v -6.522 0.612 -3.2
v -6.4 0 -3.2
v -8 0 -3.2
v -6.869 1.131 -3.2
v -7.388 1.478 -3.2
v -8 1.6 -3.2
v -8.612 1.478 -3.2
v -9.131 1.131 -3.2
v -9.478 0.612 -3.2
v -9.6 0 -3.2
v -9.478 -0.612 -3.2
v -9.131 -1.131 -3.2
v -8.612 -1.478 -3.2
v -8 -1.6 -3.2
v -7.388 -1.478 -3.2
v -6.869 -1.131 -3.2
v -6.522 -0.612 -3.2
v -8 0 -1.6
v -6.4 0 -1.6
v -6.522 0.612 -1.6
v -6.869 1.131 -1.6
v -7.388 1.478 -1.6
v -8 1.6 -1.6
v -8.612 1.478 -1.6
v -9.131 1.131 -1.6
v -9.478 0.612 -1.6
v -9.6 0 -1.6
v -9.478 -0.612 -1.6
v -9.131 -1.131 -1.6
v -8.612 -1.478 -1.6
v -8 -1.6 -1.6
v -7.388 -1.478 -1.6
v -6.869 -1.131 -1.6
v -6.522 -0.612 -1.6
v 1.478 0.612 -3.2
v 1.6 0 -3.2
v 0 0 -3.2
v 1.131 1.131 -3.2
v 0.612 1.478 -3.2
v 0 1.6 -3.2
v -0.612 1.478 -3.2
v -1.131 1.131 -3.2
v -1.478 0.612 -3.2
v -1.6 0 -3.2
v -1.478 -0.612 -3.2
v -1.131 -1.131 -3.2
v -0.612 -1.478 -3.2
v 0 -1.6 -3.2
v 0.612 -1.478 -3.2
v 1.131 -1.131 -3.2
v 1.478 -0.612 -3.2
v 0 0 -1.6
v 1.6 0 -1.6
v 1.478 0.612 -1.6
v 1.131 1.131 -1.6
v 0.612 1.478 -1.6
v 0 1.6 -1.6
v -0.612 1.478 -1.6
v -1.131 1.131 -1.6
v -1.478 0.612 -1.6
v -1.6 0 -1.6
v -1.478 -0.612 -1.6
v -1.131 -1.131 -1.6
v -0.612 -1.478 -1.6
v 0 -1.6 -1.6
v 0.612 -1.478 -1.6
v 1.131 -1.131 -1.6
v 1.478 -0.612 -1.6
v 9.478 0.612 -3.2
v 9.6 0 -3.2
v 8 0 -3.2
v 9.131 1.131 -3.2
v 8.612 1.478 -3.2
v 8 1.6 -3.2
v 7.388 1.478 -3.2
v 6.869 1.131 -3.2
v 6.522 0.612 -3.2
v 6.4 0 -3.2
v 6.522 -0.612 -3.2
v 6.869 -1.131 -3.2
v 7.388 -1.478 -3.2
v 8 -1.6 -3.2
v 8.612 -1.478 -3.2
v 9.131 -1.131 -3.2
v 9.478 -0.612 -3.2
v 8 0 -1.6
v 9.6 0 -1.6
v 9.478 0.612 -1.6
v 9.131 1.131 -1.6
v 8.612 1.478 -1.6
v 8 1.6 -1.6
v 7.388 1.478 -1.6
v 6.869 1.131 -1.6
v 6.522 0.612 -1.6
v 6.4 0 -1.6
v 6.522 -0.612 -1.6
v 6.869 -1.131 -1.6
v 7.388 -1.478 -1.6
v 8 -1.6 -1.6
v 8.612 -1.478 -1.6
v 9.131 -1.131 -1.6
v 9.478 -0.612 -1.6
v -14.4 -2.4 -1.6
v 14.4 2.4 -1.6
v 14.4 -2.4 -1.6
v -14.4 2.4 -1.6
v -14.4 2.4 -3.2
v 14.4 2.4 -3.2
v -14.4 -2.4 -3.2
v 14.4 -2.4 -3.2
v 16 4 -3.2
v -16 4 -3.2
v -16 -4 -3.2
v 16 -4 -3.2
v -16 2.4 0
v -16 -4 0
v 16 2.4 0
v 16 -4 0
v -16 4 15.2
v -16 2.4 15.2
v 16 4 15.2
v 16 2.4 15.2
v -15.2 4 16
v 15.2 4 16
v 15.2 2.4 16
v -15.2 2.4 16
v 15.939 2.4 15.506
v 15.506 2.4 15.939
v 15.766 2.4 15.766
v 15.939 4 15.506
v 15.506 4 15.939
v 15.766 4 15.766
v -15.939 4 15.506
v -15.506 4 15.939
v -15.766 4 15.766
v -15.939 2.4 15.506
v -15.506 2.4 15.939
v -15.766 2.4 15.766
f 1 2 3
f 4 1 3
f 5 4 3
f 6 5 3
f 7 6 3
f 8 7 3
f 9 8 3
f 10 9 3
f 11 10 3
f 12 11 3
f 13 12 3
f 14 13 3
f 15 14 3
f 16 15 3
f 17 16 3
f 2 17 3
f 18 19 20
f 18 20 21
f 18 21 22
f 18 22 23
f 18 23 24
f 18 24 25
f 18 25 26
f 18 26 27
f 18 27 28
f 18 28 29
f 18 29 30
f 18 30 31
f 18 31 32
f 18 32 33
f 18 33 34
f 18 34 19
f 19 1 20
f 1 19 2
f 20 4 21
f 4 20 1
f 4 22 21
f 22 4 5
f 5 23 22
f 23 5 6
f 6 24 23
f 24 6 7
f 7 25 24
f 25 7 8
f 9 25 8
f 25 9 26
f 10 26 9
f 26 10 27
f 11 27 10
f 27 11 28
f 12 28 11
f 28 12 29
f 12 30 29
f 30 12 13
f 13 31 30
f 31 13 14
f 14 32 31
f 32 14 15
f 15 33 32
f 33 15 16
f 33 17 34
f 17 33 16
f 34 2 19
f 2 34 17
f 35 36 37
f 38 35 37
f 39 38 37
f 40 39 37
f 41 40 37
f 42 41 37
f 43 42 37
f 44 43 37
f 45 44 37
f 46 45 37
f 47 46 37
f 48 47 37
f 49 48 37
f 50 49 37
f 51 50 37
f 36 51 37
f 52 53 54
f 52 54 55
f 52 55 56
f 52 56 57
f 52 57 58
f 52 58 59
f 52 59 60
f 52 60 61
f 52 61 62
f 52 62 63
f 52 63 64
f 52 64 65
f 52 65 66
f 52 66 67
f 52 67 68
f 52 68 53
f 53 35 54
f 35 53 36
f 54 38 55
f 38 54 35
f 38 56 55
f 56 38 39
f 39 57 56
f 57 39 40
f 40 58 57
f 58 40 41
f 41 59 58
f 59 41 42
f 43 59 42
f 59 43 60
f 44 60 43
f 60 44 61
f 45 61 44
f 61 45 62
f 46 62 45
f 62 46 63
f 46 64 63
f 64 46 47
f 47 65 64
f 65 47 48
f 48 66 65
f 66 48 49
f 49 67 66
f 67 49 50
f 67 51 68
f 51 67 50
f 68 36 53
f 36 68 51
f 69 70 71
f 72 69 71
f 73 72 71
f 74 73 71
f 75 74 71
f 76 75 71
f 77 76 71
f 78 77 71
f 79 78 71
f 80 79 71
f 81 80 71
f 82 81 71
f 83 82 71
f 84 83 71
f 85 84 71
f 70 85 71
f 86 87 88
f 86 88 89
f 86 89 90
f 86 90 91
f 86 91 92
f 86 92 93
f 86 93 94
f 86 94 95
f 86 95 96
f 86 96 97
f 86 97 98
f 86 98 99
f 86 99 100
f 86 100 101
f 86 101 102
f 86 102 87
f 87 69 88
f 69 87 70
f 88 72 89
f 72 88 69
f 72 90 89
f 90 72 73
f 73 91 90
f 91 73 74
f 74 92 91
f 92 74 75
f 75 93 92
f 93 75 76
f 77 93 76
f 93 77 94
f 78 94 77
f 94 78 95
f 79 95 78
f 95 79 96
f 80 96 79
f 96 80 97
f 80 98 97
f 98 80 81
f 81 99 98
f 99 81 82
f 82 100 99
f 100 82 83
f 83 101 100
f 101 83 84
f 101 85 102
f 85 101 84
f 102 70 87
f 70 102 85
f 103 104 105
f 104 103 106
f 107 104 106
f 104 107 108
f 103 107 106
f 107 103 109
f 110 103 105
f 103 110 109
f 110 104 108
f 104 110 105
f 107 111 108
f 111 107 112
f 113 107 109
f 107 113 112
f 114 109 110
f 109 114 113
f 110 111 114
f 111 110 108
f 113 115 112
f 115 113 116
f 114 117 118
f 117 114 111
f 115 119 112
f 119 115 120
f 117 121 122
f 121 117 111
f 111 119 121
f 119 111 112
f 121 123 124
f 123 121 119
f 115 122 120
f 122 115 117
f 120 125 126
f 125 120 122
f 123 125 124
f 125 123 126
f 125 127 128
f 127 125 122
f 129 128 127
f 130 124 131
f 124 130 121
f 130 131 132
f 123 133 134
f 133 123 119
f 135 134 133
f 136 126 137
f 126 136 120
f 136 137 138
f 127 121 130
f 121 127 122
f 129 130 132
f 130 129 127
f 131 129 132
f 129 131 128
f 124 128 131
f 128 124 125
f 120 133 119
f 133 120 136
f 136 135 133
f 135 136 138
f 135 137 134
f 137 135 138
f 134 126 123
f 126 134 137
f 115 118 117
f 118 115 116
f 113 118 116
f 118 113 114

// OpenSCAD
// file: ../p/4-4edge.scad
use <../lib.scad>
function ldraw_lib__4_4edge() = [
// 0 Circle 1.0
// 0 Name: 4-4edge.dat
// 0 Author: James Jessiman
// 0 !LDRAW_ORG Primitive UPDATE 2017-01
// 0 !LICENSE Licensed under CC BY 2.0 and CC BY 4.0 : see CAreadme.txt
// 
// 0 BFC CERTIFY CCW
  [0,"BFC","CERTIFY"],
  [0,"BFC","CCW"],
// 
// 0 !HISTORY 1998-12-15 [PTadmin] Official Update 1998-10
// 0 !HISTORY 2005-12-28 [PTadmin] Official Update 2005-01
// 0 !HISTORY 2007-06-24 [PTadmin] Header formatted for Contributor Agreement
// 0 !HISTORY 2008-07-01 [PTadmin] Official Update 2008-01
// 0 !HISTORY 2017-01-15 [Steffen] BFCed
// 0 !HISTORY 2017-12-30 [PTadmin] Official Update 2017-01
// 
// 
// 2 24 1 0 0 0.9239 0 0.3827
  [2,24,1,0,0,0.9239,0,0.3827],
// 2 24 0.9239 0 0.3827 0.7071 0 0.7071
  [2,24,0.9239,0,0.3827,0.7071,0,0.7071],
// 2 24 0.7071 0 0.7071 0.3827 0 0.9239
  [2,24,0.7071,0,0.7071,0.3827,0,0.9239],
// 2 24 0.3827 0 0.9239 0 0 1
  [2,24,0.3827,0,0.9239,0,0,1],
// 2 24 0 0 1 -0.3827 0 0.9239
  [2,24,0,0,1,-0.3827,0,0.9239],
// 2 24 -0.3827 0 0.9239 -0.7071 0 0.7071
  [2,24,-0.3827,0,0.9239,-0.7071,0,0.7071],
// 2 24 -0.7071 0 0.7071 -0.9239 0 0.3827
  [2,24,-0.7071,0,0.7071,-0.9239,0,0.3827],
// 2 24 -0.9239 0 0.3827 -1 0 -0
  [2,24,-0.9239,0,0.3827,-1,0,-0],
// 2 24 -1 0 -0 -0.9239 0 -0.3827
  [2,24,-1,0,-0,-0.9239,0,-0.3827],
// 2 24 -0.9239 0 -0.3827 -0.7071 0 -0.7071
  [2,24,-0.9239,0,-0.3827,-0.7071,0,-0.7071],
// 2 24 -0.7071 0 -0.7071 -0.3827 0 -0.9239
  [2,24,-0.7071,0,-0.7071,-0.3827,0,-0.9239],
// 2 24 -0.3827 0 -0.9239 0 0 -1
  [2,24,-0.3827,0,-0.9239,0,0,-1],
// 2 24 0 0 -1 0.3827 0 -0.9239
  [2,24,0,0,-1,0.3827,0,-0.9239],
// 2 24 0.3827 0 -0.9239 0.7071 0 -0.7071
  [2,24,0.3827,0,-0.9239,0.7071,0,-0.7071],
// 2 24 0.7071 0 -0.7071 0.9239 0 -0.3827
  [2,24,0.7071,0,-0.7071,0.9239,0,-0.3827],
// 2 24 0.9239 0 -0.3827 1 0 0
  [2,24,0.9239,0,-0.3827,1,0,0],
];
module ldraw_lib__4_4edge(step=0, col=false, unit=2/5, alt=false, line=0.2, solid=!$preview)
    makepoly(ldraw_lib__4_4edge(), step=step, col=col, unit=unit, alt=alt, line=line, solid=solid);
ldraw_lib__4_4edge(line=0.2);
// file: ../p/4-4disc.scad
use <../lib.scad>
function ldraw_lib__4_4disc() = [
// 0 Disc 1.0
// 0 Name: 4-4disc.dat
// 0 Author: James Jessiman
// 0 !LDRAW_ORG Primitive UPDATE 2002-02
// 0 !LICENSE Licensed under CC BY 2.0 and CC BY 4.0 : see CAreadme.txt
// 
// 0 BFC CERTIFY CCW
  [0,"BFC","CERTIFY"],
  [0,"BFC","CCW"],
// 
// 0 !HISTORY 1998-12-15 [PTadmin] Official Update 1998-10
// 0 !HISTORY 2002-03-23 [sbliss] Added BFC statement
// 0 !HISTORY 2002-04-25 [PTadmin] Official Update 2002-02
// 0 !HISTORY 2007-06-24 [PTadmin] Header formatted for Contributor Agreement
// 0 !HISTORY 2008-07-01 [PTadmin] Official Update 2008-01
// 
// 
// 3 16 0 0 0 1 0 0 0.9239 0 0.3827
  [3,16,0,0,0,1,0,0,0.9239,0,0.3827],
// 3 16 0 0 0 0.9239 0 0.3827 0.7071 0 0.7071
  [3,16,0,0,0,0.9239,0,0.3827,0.7071,0,0.7071],
// 3 16 0 0 0 0.7071 0 0.7071 0.3827 0 0.9239
  [3,16,0,0,0,0.7071,0,0.7071,0.3827,0,0.9239],
// 3 16 0 0 0 0.3827 0 0.9239 0 0 1
  [3,16,0,0,0,0.3827,0,0.9239,0,0,1],
// 3 16 0 0 0 0 0 1 -0.3827 0 0.9239
  [3,16,0,0,0,0,0,1,-0.3827,0,0.9239],
// 3 16 0 0 0 -0.3827 0 0.9239 -0.7071 0 0.7071
  [3,16,0,0,0,-0.3827,0,0.9239,-0.7071,0,0.7071],
// 3 16 0 0 0 -0.7071 0 0.7071 -0.9239 0 0.3827
  [3,16,0,0,0,-0.7071,0,0.7071,-0.9239,0,0.3827],
// 3 16 0 0 0 -0.9239 0 0.3827 -1 0 -0
  [3,16,0,0,0,-0.9239,0,0.3827,-1,0,-0],
// 3 16 0 0 0 -1 0 -0 -0.9239 0 -0.3827
  [3,16,0,0,0,-1,0,-0,-0.9239,0,-0.3827],
// 3 16 0 0 0 -0.9239 0 -0.3827 -0.7071 0 -0.7071
  [3,16,0,0,0,-0.9239,0,-0.3827,-0.7071,0,-0.7071],
// 3 16 0 0 0 -0.7071 0 -0.7071 -0.3827 0 -0.9239
  [3,16,0,0,0,-0.7071,0,-0.7071,-0.3827,0,-0.9239],
// 3 16 0 0 0 -0.3827 0 -0.9239 0 0 -1
  [3,16,0,0,0,-0.3827,0,-0.9239,0,0,-1],
// 3 16 0 0 0 0 0 -1 0.3827 0 -0.9239
  [3,16,0,0,0,0,0,-1,0.3827,0,-0.9239],
// 3 16 0 0 0 0.3827 0 -0.9239 0.7071 0 -0.7071
  [3,16,0,0,0,0.3827,0,-0.9239,0.7071,0,-0.7071],
// 3 16 0 0 0 0.7071 0 -0.7071 0.9239 0 -0.3827
  [3,16,0,0,0,0.7071,0,-0.7071,0.9239,0,-0.3827],
// 3 16 0 0 0 0.9239 0 -0.3827 1 0 0
  [3,16,0,0,0,0.9239,0,-0.3827,1,0,0],
// 0
];
module ldraw_lib__4_4disc(step=0, col=false, unit=2/5, alt=false, line=0.2, solid=!$preview)
    makepoly(ldraw_lib__4_4disc(), step=step, col=col, unit=unit, alt=alt, line=line, solid=solid);
ldraw_lib__4_4disc(line=0.2);
// file: ../p/4-4cyli.scad
use <../lib.scad>
$fa=1; $fs=0.2;
function ldraw_lib__4_4cyli(realsolid=false) = [
// 0 Cylinder 1.0
// 0 Name: 4-4cyli.dat
// 0 Author: James Jessiman
// 0 !LDRAW_ORG Primitive UPDATE 2005-01
// 0 !LICENSE Licensed under CC BY 2.0 and CC BY 4.0 : see CAreadme.txt
// 
// 0 BFC CERTIFY CCW
  [0,"BFC","CERTIFY"],
  [0,"BFC","CCW"],
// 
// 0 !HISTORY 1998-12-15 [PTadmin] Official Update 1998-10
// 0 !HISTORY 2002-03-23 [sbliss] Added BFC statement; merged headers from files in distributions LDraw 0.27 and Complete.
// 0 !HISTORY 2002-04-25 [PTadmin] Official Update 2002-02
// 0 !HISTORY 2004-12-14 [guyvivan] BFC CCW
// 0 !HISTORY 2005-12-28 [PTadmin] Official Update 2005-01
// 0 !HISTORY 2007-06-24 [PTadmin] Header formatted for Contributor Agreement
// 0 !HISTORY 2008-07-01 [PTadmin] Official Update 2008-01
// 
// 
// 4 16 1 1 0 0.9239 1 0.3827 0.9239 0 0.3827 1 0 0
  [4,16,1,1,0,0.9239,1,0.3827,0.9239,0,0.3827,1,0,0],
// 5 24 1 0 0 1 1 0 0.9239 0 0.3827 0.9239 0 -0.3827
  [5,24,1,0,0,1,1,0,0.9239,0,0.3827,0.9239,0,-0.3827],
// 4 16 0.9239 1 0.3827 0.7071 1 0.7071 0.7071 0 0.7071 0.9239 0 0.3827
  [4,16,0.9239,1,0.3827,0.7071,1,0.7071,0.7071,0,0.7071,0.9239,0,0.3827],
// 5 24 0.9239 0 0.3827 0.9239 1 0.3827 0.7071 0 0.7071 1 0 0
  [5,24,0.9239,0,0.3827,0.9239,1,0.3827,0.7071,0,0.7071,1,0,0],
// 4 16 0.7071 1 0.7071 0.3827 1 0.9239 0.3827 0 0.9239 0.7071 0 0.7071
  [4,16,0.7071,1,0.7071,0.3827,1,0.9239,0.3827,0,0.9239,0.7071,0,0.7071],
// 5 24 0.7071 0 0.7071 0.7071 1 0.7071 0.3827 0 0.9239 0.9239 0 0.3827
  [5,24,0.7071,0,0.7071,0.7071,1,0.7071,0.3827,0,0.9239,0.9239,0,0.3827],
// 4 16 0.3827 1 0.9239 0 1 1 0 0 1 0.3827 0 0.9239
  [4,16,0.3827,1,0.9239,0,1,1,0,0,1,0.3827,0,0.9239],
// 5 24 0.3827 0 0.9239 0.3827 1 0.9239 0 0 1 0.7071 0 0.7071
  [5,24,0.3827,0,0.9239,0.3827,1,0.9239,0,0,1,0.7071,0,0.7071],
// 4 16 0 1 1 -0.3827 1 0.9239 -0.3827 0 0.9239 0 0 1
  [4,16,0,1,1,-0.3827,1,0.9239,-0.3827,0,0.9239,0,0,1],
// 5 24 0 0 1 0 1 1 -0.3827 0 0.9239 0.3827 0 0.9239
  [5,24,0,0,1,0,1,1,-0.3827,0,0.9239,0.3827,0,0.9239],
// 4 16 -0.3827 1 0.9239 -0.7071 1 0.7071 -0.7071 0 0.7071 -0.3827 0 0.9239
  [4,16,-0.3827,1,0.9239,-0.7071,1,0.7071,-0.7071,0,0.7071,-0.3827,0,0.9239],
// 5 24 -0.3827 0 0.9239 -0.3827 1 0.9239 -0.7071 0 0.7071 0 0 1
  [5,24,-0.3827,0,0.9239,-0.3827,1,0.9239,-0.7071,0,0.7071,0,0,1],
// 4 16 -0.7071 1 0.7071 -0.9239 1 0.3827 -0.9239 0 0.3827 -0.7071 0 0.7071
  [4,16,-0.7071,1,0.7071,-0.9239,1,0.3827,-0.9239,0,0.3827,-0.7071,0,0.7071],
// 5 24 -0.7071 0 0.7071 -0.7071 1 0.7071 -0.9239 0 0.3827 -0.3827 0 0.9239
  [5,24,-0.7071,0,0.7071,-0.7071,1,0.7071,-0.9239,0,0.3827,-0.3827,0,0.9239],
// 4 16 -0.9239 1 0.3827 -1 1 0 -1 0 0 -0.9239 0 0.3827
  [4,16,-0.9239,1,0.3827,-1,1,0,-1,0,0,-0.9239,0,0.3827],
// 5 24 -0.9239 0 0.3827 -0.9239 1 0.3827 -1 0 0 -0.7071 0 0.7071
  [5,24,-0.9239,0,0.3827,-0.9239,1,0.3827,-1,0,0,-0.7071,0,0.7071],
// 4 16 -1 1 0 -0.9239 1 -0.3827 -0.9239 0 -0.3827 -1 0 0
  [4,16,-1,1,0,-0.9239,1,-0.3827,-0.9239,0,-0.3827,-1,0,0],
// 5 24 -1 0 0 -1 1 0 -0.9239 0 -0.3827 -0.9239 0 0.3827
  [5,24,-1,0,0,-1,1,0,-0.9239,0,-0.3827,-0.9239,0,0.3827],
// 4 16 -0.9239 1 -0.3827 -0.7071 1 -0.7071 -0.7071 0 -0.7071 -0.9239 0 -0.3827
  [4,16,-0.9239,1,-0.3827,-0.7071,1,-0.7071,-0.7071,0,-0.7071,-0.9239,0,-0.3827],
// 5 24 -0.9239 0 -0.3827 -0.9239 1 -0.3827 -0.7071 0 -0.7071 -1 0 0
  [5,24,-0.9239,0,-0.3827,-0.9239,1,-0.3827,-0.7071,0,-0.7071,-1,0,0],
// 4 16 -0.7071 1 -0.7071 -0.3827 1 -0.9239 -0.3827 0 -0.9239 -0.7071 0 -0.7071
  [4,16,-0.7071,1,-0.7071,-0.3827,1,-0.9239,-0.3827,0,-0.9239,-0.7071,0,-0.7071],
// 5 24 -0.7071 0 -0.7071 -0.7071 1 -0.7071 -0.3827 0 -0.9239 -0.9239 0 -0.3827
  [5,24,-0.7071,0,-0.7071,-0.7071,1,-0.7071,-0.3827,0,-0.9239,-0.9239,0,-0.3827],
// 4 16 -0.3827 1 -0.9239 0 1 -1 0 0 -1 -0.3827 0 -0.9239
  [4,16,-0.3827,1,-0.9239,0,1,-1,0,0,-1,-0.3827,0,-0.9239],
// 5 24 -0.3827 0 -0.9239 -0.3827 1 -0.9239 0 0 -1 -0.7071 0 -0.7071
  [5,24,-0.3827,0,-0.9239,-0.3827,1,-0.9239,0,0,-1,-0.7071,0,-0.7071],
// 4 16 0 1 -1 0.3827 1 -0.9239 0.3827 0 -0.9239 0 0 -1
  [4,16,0,1,-1,0.3827,1,-0.9239,0.3827,0,-0.9239,0,0,-1],
// 5 24 0 0 -1 0 1 -1 0.3827 0 -0.9239 -0.3827 0 -0.9239
  [5,24,0,0,-1,0,1,-1,0.3827,0,-0.9239,-0.3827,0,-0.9239],
// 4 16 0.3827 1 -0.9239 0.7071 1 -0.7071 0.7071 0 -0.7071 0.3827 0 -0.9239
  [4,16,0.3827,1,-0.9239,0.7071,1,-0.7071,0.7071,0,-0.7071,0.3827,0,-0.9239],
// 5 24 0.3827 0 -0.9239 0.3827 1 -0.9239 0.7071 0 -0.7071 0 0 -1
  [5,24,0.3827,0,-0.9239,0.3827,1,-0.9239,0.7071,0,-0.7071,0,0,-1],
// 4 16 0.7071 1 -0.7071 0.9239 1 -0.3827 0.9239 0 -0.3827 0.7071 0 -0.7071
  [4,16,0.7071,1,-0.7071,0.9239,1,-0.3827,0.9239,0,-0.3827,0.7071,0,-0.7071],
// 5 24 0.7071 0 -0.7071 0.7071 1 -0.7071 0.9239 0 -0.3827 0.3827 0 -0.9239
  [5,24,0.7071,0,-0.7071,0.7071,1,-0.7071,0.9239,0,-0.3827,0.3827,0,-0.9239],
// 4 16 0.9239 1 -0.3827 1 1 0 1 0 0 0.9239 0 -0.3827
  [4,16,0.9239,1,-0.3827,1,1,0,1,0,0,0.9239,0,-0.3827],
// 5 24 0.9239 0 -0.3827 0.9239 1 -0.3827 1 0 0 0.7071 0 -0.7071
  [5,24,0.9239,0,-0.3827,0.9239,1,-0.3827,1,0,0,0.7071,0,-0.7071],
// 0
];
module ldraw_lib__4_4cyli(step=0, col=false, unit=2/5, alt=false, line=0.2, solid=!$preview)
    makepoly(ldraw_lib__4_4cyli(solid), step=step, col=col, unit=unit, alt=alt, line=line, solid=solid);
ldraw_lib__4_4cyli(line=0.2);
// file: ../p/stud3.scad
use <../lib.scad>
use <4-4cyli.scad>
use <4-4disc.scad>
use <4-4edge.scad>
function ldraw_lib__stud3() = [
// 0 Stud Tube Solid
// 0 Name: stud3.dat
// 0 Author: James Jessiman
// 0 !LDRAW_ORG Primitive UPDATE 2012-01
// 0 !LICENSE Licensed under CC BY 4.0 : see CAreadme.txt
// 
// 0 BFC CERTIFY CCW
  [0,"BFC","CERTIFY"],
  [0,"BFC","CCW"],
// 
// 0 !HISTORY 2002-04-04 [sbliss] Modified for BFC compliance
// 0 !HISTORY 2002-04-25 [PTadmin] Official Update 2002-02
// 0 !HISTORY 2007-06-24 [PTadmin] Header formatted for Contributor Agreement
// 0 !HISTORY 2008-07-01 [PTadmin] Official Update 2008-01
// 0 !HISTORY 2012-02-16 [Philo] Changed to CCW
// 0 !HISTORY 2012-03-30 [PTadmin] Official Update 2012-01
// 
// 
// 1 16 0 -4 0 4 0 0 0 1 0 0 0 4 4-4edge.dat
  [1,16,0,-4,0,4,0,0,0,1,0,0,0,4, ldraw_lib__4_4edge()],
// 1 16 0 0 0 4 0 0 0 1 0 0 0 4 4-4edge.dat
  [1,16,0,0,0,4,0,0,0,1,0,0,0,4, ldraw_lib__4_4edge()],
// 1 16 0 -4 0 4 0 0 0 1 0 0 0 4 4-4disc.dat
  [1,16,0,-4,0,4,0,0,0,1,0,0,0,4, ldraw_lib__4_4disc()],
  [-1,16,0,0,0,4,0,0,0,-1,0,0,0,4, ldraw_lib__4_4disc()],
// 1 16 0 -4 0 4 0 0 0 4 0 0 0 4 4-4cyli.dat
  [1,16,0,-4,0,4,0,0,0,4,0,0,0,4, ldraw_lib__4_4cyli()],
];
module ldraw_lib__stud3(step=0, col=false, unit=2/5, alt=false, line=0.2, solid=!$preview)
    makepoly(ldraw_lib__stud3(), step=step, col=col, unit=unit, alt=alt, line=line, solid=solid);
ldraw_lib__stud3(line=0.2);
// file: ../p/1-4edge.scad
use <../lib.scad>
$fa=1; $fs=0.2;
function ldraw_lib__1_4edge(realsolid=false) = [
// 0 Circle 0.25
// 0 Name: 1-4edge.dat
// 0 Author: James Jessiman
// 0 !LDRAW_ORG Primitive UPDATE 2017-01
// 0 !LICENSE Licensed under CC BY 2.0 and CC BY 4.0 : see CAreadme.txt
// 
// 0 BFC CERTIFY CCW
  [0,"BFC","CERTIFY"],
  [0,"BFC","CCW"],
// 
// 0 !HISTORY 2007-06-22 [PTadmin] Header formatted for Contributor Agreement
// 0 !HISTORY 2008-07-01 [PTadmin] Official Update 2008-01
// 0 !HISTORY 2017-01-15 [Steffen] BFCed
// 0 !HISTORY 2017-12-30 [PTadmin] Official Update 2017-01
// 
// 
// 2 24 1 0 0 0.9239 0 0.3827
  [2,24,1,0,0,0.9239,0,0.3827],
// 2 24 0.9239 0 0.3827 0.7071 0 0.7071
  [2,24,0.9239,0,0.3827,0.7071,0,0.7071],
// 2 24 0.7071 0 0.7071 0.3827 0 0.9239
  [2,24,0.7071,0,0.7071,0.3827,0,0.9239],
// 2 24 0.3827 0 0.9239 0 0 1
  [2,24,0.3827,0,0.9239,0,0,1],
];
module ldraw_lib__1_4edge(step=0, col=false, unit=2/5, alt=false, line=0.2, solid=!$preview)
    makepoly(ldraw_lib__1_4edge(solid), step=step, col=col, unit=unit, alt=alt, line=line, solid=solid);
ldraw_lib__1_4edge(line=0.2);
// file: ../p/1-4cyli.scad
use <../lib.scad>
function ldraw_lib__1_4cyli() = [
// 0 Cylinder 0.25
// 0 Name: 1-4cyli.dat
// 0 Author: James Jessiman
// 0 !LDRAW_ORG Primitive UPDATE 2012-01
// 0 !LICENSE Licensed under CC BY 2.0 and CC BY 4.0 : see CAreadme.txt
// 
// 0 BFC CERTIFY CCW
  [0,"BFC","CERTIFY"],
  [0,"BFC","CCW"],
// 
// 0 !HISTORY 2002-03-23 [sbliss] Added BFC statement.
// 0 !HISTORY 2002-04-25 [PTadmin] Official Update 2002-02
// 0 !HISTORY 2007-06-22 [PTadmin] Header formatted for Contributor Agreement
// 0 !HISTORY 2008-07-01 [PTadmin] Official Update 2008-01
// 0 !HISTORY 2012-02-16 [Philo] Changed to CCW
// 0 !HISTORY 2012-03-30 [PTadmin] Official Update 2012-01
// 
// 
// 4 16 1 1 0 0.9239 1 0.3827 0.9239 0 0.3827 1 0 0
  [4,16,1,1,0,0.9239,1,0.3827,0.9239,0,0.3827,1,0,0],
// 5 24 1 0 0 1 1 0 0.9239 0 0.3827 1 0 -1
  [5,24,1,0,0,1,1,0,0.9239,0,0.3827,1,0,-1],
// 4 16 0.9239 1 0.3827 0.7071 1 0.7071 0.7071 0 0.7071 0.9239 0 0.3827
  [4,16,0.9239,1,0.3827,0.7071,1,0.7071,0.7071,0,0.7071,0.9239,0,0.3827],
// 5 24 0.9239 0 0.3827 0.9239 1 0.3827 0.7071 0 0.7071 1 0 0
  [5,24,0.9239,0,0.3827,0.9239,1,0.3827,0.7071,0,0.7071,1,0,0],
// 4 16 0.7071 1 0.7071 0.3827 1 0.9239 0.3827 0 0.9239 0.7071 0 0.7071
  [4,16,0.7071,1,0.7071,0.3827,1,0.9239,0.3827,0,0.9239,0.7071,0,0.7071],
// 5 24 0.7071 0 0.7071 0.7071 1 0.7071 0.3827 0 0.9239 0.9239 0 0.3827
  [5,24,0.7071,0,0.7071,0.7071,1,0.7071,0.3827,0,0.9239,0.9239,0,0.3827],
// 4 16 0.3827 1 0.9239 0 1 1 0 0 1 0.3827 0 0.9239
  [4,16,0.3827,1,0.9239,0,1,1,0,0,1,0.3827,0,0.9239],
// 5 24 0.3827 0 0.9239 0.3827 1 0.9239 0 0 1 0.7071 0 0.7071
  [5,24,0.3827,0,0.9239,0.3827,1,0.9239,0,0,1,0.7071,0,0.7071],
// 5 24 0 0 1 0 1 1 0.3827 0 0.9239 -1 0 1
  [5,24,0,0,1,0,1,1,0.3827,0,0.9239,-1,0,1],
];
module ldraw_lib__1_4cyli(step=0, col=false, unit=2/5, alt=false, line=0.2, solid=!$preview)
    makepoly(ldraw_lib__1_4cyli(), step=step, col=col, unit=unit, alt=alt, line=line, solid=solid);
ldraw_lib__1_4cyli(line=0.2);
// file: ../p/stug3-1x3.scad
use <../lib.scad>
use <stud3.scad>
$fa=1; $fs=0.2;
function ldraw_lib__stug3_1x3(realsolid=false) = [
// 0 Stud Tube Solid Group  1 x  3
// 0 Name: stug3-1x3.dat
// 0 Author: Steffen [Steffen]
// 0 !LDRAW_ORG Primitive UPDATE 2012-02
// 0 !LICENSE Licensed under CC BY 2.0 and CC BY 4.0 : see CAreadme.txt
// 
// 0 BFC CERTIFY CCW
  [0,"BFC","CERTIFY"],
  [0,"BFC","CCW"],
// 
// 0 !HISTORY 2012-08-09 [PTadmin] Official Update 2012-02
// 
// 
// 1 16 -20 0 0 1 0 0 0 1 0 0 0 1 stud3.dat
  [1,16,-20,0,0,1,0,0,0,1,0,0,0,1, ldraw_lib__stud3(realsolid)],
// 1 16 0 0 0 1 0 0 0 1 0 0 0 1 stud3.dat
  [1,16,0,0,0,1,0,0,0,1,0,0,0,1, ldraw_lib__stud3(realsolid)],
// 1 16 20 0 0 1 0 0 0 1 0 0 0 1 stud3.dat
  [1,16,20,0,0,1,0,0,0,1,0,0,0,1, ldraw_lib__stud3(realsolid)],
];
module ldraw_lib__stug3_1x3(step=0, col=false, unit=2/5, alt=false, line=0.2, solid=!$preview)
    makepoly(ldraw_lib__stug3_1x3(solid), step=step, col=col, unit=unit, alt=alt, line=line, solid=solid);
ldraw_lib__stug3_1x3(line=0.2);
// file: ../p/recte3.scad
use <../lib.scad>
$fa=1; $fs=0.2;
function ldraw_lib__recte3(realsolid=false) = [
// 0 Rectangle Empty with 3 Edges
// 0 Name: recte3.dat
// 0 Author: Steffen [Steffen]
// 0 !LDRAW_ORG Primitive UPDATE 2011-01
// 0 !LICENSE Licensed under CC BY 2.0 and CC BY 4.0 : see CAreadme.txt
// 
// 0 BFC CERTIFY CCW
  [0,"BFC","CERTIFY"],
  [0,"BFC","CCW"],
// 
// 0 !HISTORY 2011-07-25 [PTadmin] Official Update 2011-01
// 
// 
// 2 24 1 0 1 -1 0 1
  [2,24,1,0,1,-1,0,1],
// 2 24 -1 0 1 -1 0 -1
  [2,24,-1,0,1,-1,0,-1],
// 2 24 1 0 -1 1 0 1
  [2,24,1,0,-1,1,0,1],
];
module ldraw_lib__recte3(step=0, col=false, unit=2/5, alt=false, line=0.2, solid=!$preview)
    makepoly(ldraw_lib__recte3(solid), step=step, col=col, unit=unit, alt=alt, line=line, solid=solid);
ldraw_lib__recte3(line=0.2);
// file: ../p/rect2p.scad
use <../lib.scad>
function ldraw_lib__rect2p() = [
// 0 Rectangle with 2 Parallel Edges
// 0 Name: rect2p.dat
// 0 Author: Donald Sutter [technog]
// 0 !LDRAW_ORG Primitive UPDATE 2010-01
// 0 !LICENSE Licensed under CC BY 2.0 and CC BY 4.0 : see CAreadme.txt
// 
// 0 BFC CERTIFY CCW
  [0,"BFC","CERTIFY"],
  [0,"BFC","CCW"],
// 
// 0 !HISTORY 2003-08-01 [PTadmin] Official Update 2003-02
// 0 !HISTORY 2007-06-24 [PTadmin] Header formatted for Contributor Agreement
// 0 !HISTORY 2008-07-01 [PTadmin] Official Update 2008-01
// 0 !HISTORY 2010-01-17 [mikeheide] changed winding to CCW
// 0 !HISTORY 2010-04-05 [PTadmin] Official Update 2010-01
// 
// 
// 2 24 1 0 1 -1 0 1
  [2,24,1,0,1,-1,0,1],
// 2 24 -1 0 -1 1 0 -1
  [2,24,-1,0,-1,1,0,-1],
// 4 16 -1 0 1 -1 0 -1 1 0 -1 1 0 1
  [4,16,-1,0,1,-1,0,-1,1,0,-1,1,0,1],
// 0
];
module ldraw_lib__rect2p(step=0, col=false, unit=2/5, alt=false, line=0.2, solid=!$preview)
    makepoly(ldraw_lib__rect2p(), step=step, col=col, unit=unit, alt=alt, line=line, solid=solid);
ldraw_lib__rect2p(line=0.2);
// file: ../p/box5.scad
use <../lib.scad>
function ldraw_lib__box5() = [
// 0 Box with 5 Faces and All Edges
// 0 Name: box5.dat
// 0 Author: James Jessiman
// 0 !LDRAW_ORG Primitive UPDATE 2012-01
// 0 !LICENSE Licensed under CC BY 2.0 and CC BY 4.0 : see CAreadme.txt
// 
// 0 BFC CERTIFY CCW
  [0,"BFC","CERTIFY"],
  [0,"BFC","CCW"],
// 
// 0 !HISTORY 2002-04-03 [sbliss] Modified for BFC compliance
// 0 !HISTORY 2002-04-25 [PTadmin] Official Update 2002-02
// 0 !HISTORY 2007-06-24 [PTadmin] Header formatted for Contributor Agreement
// 0 !HISTORY 2008-07-01 [PTadmin] Official Update 2008-01
// 0 !HISTORY 2012-02-16 [Philo] Changed to CCW
// 0 !HISTORY 2012-03-30 [PTadmin] Official Update 2012-01
// 
// 
// 2 24 1 1 1 -1 1 1
  [2,24,1,1,1,-1,1,1],
// 2 24 -1 1 1 -1 1 -1
  [2,24,-1,1,1,-1,1,-1],
// 2 24 -1 1 -1 1 1 -1
  [2,24,-1,1,-1,1,1,-1],
// 2 24 1 1 -1 1 1 1
  [2,24,1,1,-1,1,1,1],
// 2 24 1 0 1 -1 0 1
  [2,24,1,0,1,-1,0,1],
// 2 24 -1 0 1 -1 0 -1
  [2,24,-1,0,1,-1,0,-1],
// 2 24 -1 0 -1 1 0 -1
  [2,24,-1,0,-1,1,0,-1],
// 2 24 1 0 -1 1 0 1
  [2,24,1,0,-1,1,0,1],
// 2 24 1 0 1 1 1 1
  [2,24,1,0,1,1,1,1],
// 2 24 -1 0 1 -1 1 1
  [2,24,-1,0,1,-1,1,1],
// 2 24 1 0 -1 1 1 -1
  [2,24,1,0,-1,1,1,-1],
// 2 24 -1 0 -1 -1 1 -1
  [2,24,-1,0,-1,-1,1,-1],
// 4 16 -1 1 1 1 1 1 1 1 -1 -1 1 -1
  [4,16,-1,1,1,1,1,1,1,1,-1,-1,1,-1],
// 4 16 -1 1 1 -1 0 1 1 0 1 1 1 1
  [4,16,-1,1,1,-1,0,1,1,0,1,1,1,1],
// 4 16 -1 1 -1 -1 0 -1 -1 0 1 -1 1 1
  [4,16,-1,1,-1,-1,0,-1,-1,0,1,-1,1,1],
// 4 16 1 1 -1 1 0 -1 -1 0 -1 -1 1 -1
  [4,16,1,1,-1,1,0,-1,-1,0,-1,-1,1,-1],
// 4 16 1 1 1 1 0 1 1 0 -1 1 1 -1
  [4,16,1,1,1,1,0,1,1,0,-1,1,1,-1],
];
makepoly(ldraw_lib__box5(), line=0.2);
// file: ../p/box2-5.scad
use <../lib.scad>
$fa=1; $fs=0.2;
function ldraw_lib__box2_5(realsolid=false) = [
// 0 Box with 2 Faces without 5 Edges
// 0 Name: box2-5.dat
// 0 Author: Steffen [Steffen]
// 0 !LDRAW_ORG Primitive UPDATE 2003-03
// 0 !LICENSE Licensed under CC BY 2.0 and CC BY 4.0 : see CAreadme.txt
// 
// 0 BFC CERTIFY CCW
  [0,"BFC","CERTIFY"],
  [0,"BFC","CCW"],
// 
// 0 !HISTORY 2003-12-19 [PTadmin] Official Update 2003-03
// 0 !HISTORY 2007-06-24 [PTadmin] Header formatted for Contributor Agreement
// 0 !HISTORY 2008-07-01 [PTadmin] Official Update 2008-01
// 
// 
// 2 24 1 1 1 -1 1 1
  [2,24,1,1,1,-1,1,1],
// 2 24 1 1 -1 -1 1 -1
  [2,24,1,1,-1,-1,1,-1],
// 2 24 1 -1 1 -1 -1 1
  [2,24,1,-1,1,-1,-1,1],
// 2 24 -1 -1 1 -1 1 1
  [2,24,-1,-1,1,-1,1,1],
// 2 24 1 -1 1 1 1 1
  [2,24,1,-1,1,1,1,1],
// 2 24 -1 1 -1 -1 1 1
  [2,24,-1,1,-1,-1,1,1],
// 2 24 1 1 -1 1 1 1
  [2,24,1,1,-1,1,1,1],
// 4 16 1 1 1 1 1 -1 -1 1 -1 -1 1 1
  [4,16,1,1,1,1,1,-1,-1,1,-1,-1,1,1],
// 4 16 1 1 1 -1 1 1 -1 -1 1 1 -1 1
  [4,16,1,1,1,-1,1,1,-1,-1,1,1,-1,1],
// 0
];
module ldraw_lib__box2_5(step=0, col=false, unit=2/5, alt=false, line=0.2, solid=!$preview)
    makepoly(ldraw_lib__box2_5(solid), step=step, col=col, unit=unit, alt=alt, line=line, solid=solid);
ldraw_lib__box2_5(line=0.2);
// file: ../p/1-4cylo.scad
use <../lib.scad>
use <1-4cyli.scad>
use <1-4edge.scad>
$fa=1; $fs=0.2;
function ldraw_lib__1_4cylo(realsolid=false) = [
// 0 Cylinder Open 0.25
// 0 Name: 1-4cylo.dat
// 0 Author: Max Martin Richter [MMR1988]
// 0 !LDRAW_ORG Primitive UPDATE 2010-03
// 0 !LICENSE Licensed under CC BY 2.0 and CC BY 4.0 : see CAreadme.txt
// 
// 0 BFC CERTIFY CCW
  [0,"BFC","CERTIFY"],
  [0,"BFC","CCW"],
// 
// 0 !HISTORY 2010-12-31 [PTadmin] Official Update 2010-03
// 
// 
// 1 16 0 0 0 1 0 0 0 1 0 0 0 1 1-4edge.dat
  [1,16,0,0,0,1,0,0,0,1,0,0,0,1, ldraw_lib__1_4edge(realsolid)],
// 1 16 0 1 0 1 0 0 0 1 0 0 0 1 1-4edge.dat
  [1,16,0,1,0,1,0,0,0,1,0,0,0,1, ldraw_lib__1_4edge(realsolid)],
// 1 16 0 0 0 1 0 0 0 1 0 0 0 1 1-4cyli.dat
  [1,16,0,0,0,1,0,0,0,1,0,0,0,1, ldraw_lib__1_4cyli(realsolid)],
];
module ldraw_lib__1_4cylo(step=0, col=false, unit=2/5, alt=false, line=0.2, solid=!$preview)
    makepoly(ldraw_lib__1_4cylo(solid), step=step, col=col, unit=unit, alt=alt, line=line, solid=solid);
ldraw_lib__1_4cylo(line=0.2);
// file: ../p/1-4chrd.scad
use <../lib.scad>
$fa=1; $fs=0.2;
function ldraw_lib__1_4chrd(realsolid=false) = [
// 0 Chord 0.25
// 0 Name: 1-4chrd.dat
// 0 Author: Tony Hafner [hafhead]
// 0 !LDRAW_ORG Primitive UPDATE 2012-02
// 0 !LICENSE Licensed under CC BY 2.0 and CC BY 4.0 : see CAreadme.txt
// 
// 0 BFC CERTIFY CCW
  [0,"BFC","CERTIFY"],
  [0,"BFC","CCW"],
// 
// 0 !HISTORY 2004-04-22 [PTadmin] Official Update 2004-02
// 0 !HISTORY 2007-10-09 [PTadmin] Header formatted for Contributor Agreement
// 0 !HISTORY 2008-07-01 [PTadmin] Official Update 2008-01
// 0 !HISTORY 2012-08-02 [MMR1988] Re-creation with PrimGen2 and Rectifier
// 0 !HISTORY 2012-08-09 [PTadmin] Official Update 2012-02
// 
// 
// 4 16 0.9239 0 0.3827 0.3827 0 0.9239 0 0 1 1 0 0
  [4,16,0.9239,0,0.3827,0.3827,0,0.9239,0,0,1,1,0,0],
// 3 16 0.7071 0 0.7071 0.3827 0 0.9239 0.9239 0 0.3827
  [3,16,0.7071,0,0.7071,0.3827,0,0.9239,0.9239,0,0.3827],
];
module ldraw_lib__1_4chrd(step=0, col=false, unit=2/5, alt=false, line=0.2, solid=!$preview)
    makepoly(ldraw_lib__1_4chrd(solid), step=step, col=col, unit=unit, alt=alt, line=line, solid=solid);
ldraw_lib__1_4chrd(line=0.2);
// main file
use <../lib.scad>
use <../p/1-4chrd.scad>
use <../p/1-4cylo.scad>
use <../p/box2-5.scad>
use <../p/box5.scad>
use <../p/rect2p.scad>
use <../p/recte3.scad>
use <../p/stug3-1x3.scad>
function ldraw_lib__8012() = [
// 0 Panel  1 x  4 x  2 with Rounded Corners
// 0 Name: 8012.dat
// 0 Author: Gerald Lasser [GeraldLasser]
// 0 !LDRAW_ORG Part UPDATE 2026-07
// 0 !LICENSE Licensed under CC BY 4.0 : see CAreadme.txt
// 
// 0 BFC CERTIFY CCW
  [0,"BFC","CERTIFY"],
  [0,"BFC","CCW"],
// 
// 0 !CATEGORY Panel
// 0 !KEYWORDS Brickowl 392634
// 
// 0 !HISTORY 2026-07-30 [OrionP] Official Update 2026-07
// 
// 1 16 0 4 0 1 0 0 0 -1 0 0 0 1 stug3-1x3.dat
  [1,16,0,4,0,1,0,0,0,-1,0,0,0,1, ldraw_lib__stug3_1x3()],
// 0 BFC INVERTNEXT
  [0,"BFC","INVERTNEXT"],
// 1 16 0 8 0 36 0 0 0 -4 0 0 0 6 box5.dat
  [1,16,0,8,0,36,0,0,0,-4,0,0,0,6, ldraw_lib__box5()],
// 1 16 0 8 0 40 0 0 0 1 0 0 0 10 recte3.dat
  [1,16,0,8,0,40,0,0,0,1,0,0,0,10, ldraw_lib__recte3()],
// 4 16 40 8 10 36 8 6 -36 8 6 -40 8 10
  [4,16,40,8,10,36,8,6,-36,8,6,-40,8,10],
// 4 16 -40 8 10 -36 8 6 -36 8 -6 -40 8 -10
  [4,16,-40,8,10,-36,8,6,-36,8,-6,-40,8,-10],
// 4 16 -40 8 -10 -36 8 -6 36 8 -6 40 8 -10
  [4,16,-40,8,-10,-36,8,-6,36,8,-6,40,8,-10],
// 4 16 40 8 -10 36 8 -6 36 8 6 40 8 10
  [4,16,40,8,-10,36,8,-6,36,8,6,40,8,10],
// 2 24 40 -38 6 40 0 6
  [2,24,40,-38,6,40,0,6],
// 2 24 -40 -38 6 -40 0 6
  [2,24,-40,-38,6,-40,0,6],
// 2 24 40 -38 10 40 8 10
  [2,24,40,-38,10,40,8,10],
// 2 24 -40 -38 10 -40 8 10
  [2,24,-40,-38,10,-40,8,10],
// 4 16 -40 8 10 -40 8 -10 -40 0 -10 -40 0 6
  [4,16,-40,8,10,-40,8,-10,-40,0,-10,-40,0,6],
// 4 16 40 8 -10 40 8 10 40 0 6 40 0 -10
  [4,16,40,8,-10,40,8,10,40,0,6,40,0,-10],
// 4 16 -40 8 10 -40 0 6 -40 -38 6 -40 -38 10
  [4,16,-40,8,10,-40,0,6,-40,-38,6,-40,-38,10],
// 4 16 40 0 6 40 8 10 40 -38 10 40 -38 6
  [4,16,40,0,6,40,8,10,40,-38,10,40,-38,6],
// 4 16 40 8 10 -40 8 10 -40 -38 10 40 -38 10
  [4,16,40,8,10,-40,8,10,-40,-38,10,40,-38,10],
// 4 16 40 -38 10 -40 -38 10 -38 -40 10 38 -40 10
  [4,16,40,-38,10,-40,-38,10,-38,-40,10,38,-40,10],
// 4 16 -40 0 6 40 0 6 40 -38 6 -40 -38 6
  [4,16,-40,0,6,40,0,6,40,-38,6,-40,-38,6],
// 4 16 -40 -38 6 40 -38 6 38 -40 6 -38 -40 6
  [4,16,-40,-38,6,40,-38,6,38,-40,6,-38,-40,6],
// 1 16 0 -40 8 -38 0 0 0 1 0 0 0 -2 rect2p.dat
  [1,16,0,-40,8,-38,0,0,0,1,0,0,0,-2, ldraw_lib__rect2p()],
// 1 16 38 -38 6 2 0 0 0 0 -2 0 1 0 1-4chrd.dat
  [1,16,38,-38,6,2,0,0,0,0,-2,0,1,0, ldraw_lib__1_4chrd()],
// 1 16 38 -38 10 2 0 0 0 0 -2 0 -1 0 1-4chrd.dat
  [1,16,38,-38,10,2,0,0,0,0,-2,0,-1,0, ldraw_lib__1_4chrd()],
// 1 16 -38 -38 10 -2 0 0 0 0 -2 0 -1 0 1-4chrd.dat
  [1,16,-38,-38,10,-2,0,0,0,0,-2,0,-1,0, ldraw_lib__1_4chrd()],
// 1 16 -38 -38 6 -2 0 0 0 0 -2 0 1 0 1-4chrd.dat
  [1,16,-38,-38,6,-2,0,0,0,0,-2,0,1,0, ldraw_lib__1_4chrd()],
// 1 16 38 -38 6 2 0 0 0 0 -2 0 4 0 1-4cylo.dat
  [1,16,38,-38,6,2,0,0,0,0,-2,0,4,0, ldraw_lib__1_4cylo()],
// 1 16 -38 -38 10 -2 0 0 0 0 -2 0 -4 0 1-4cylo.dat
  [1,16,-38,-38,10,-2,0,0,0,0,-2,0,-4,0, ldraw_lib__1_4cylo()],
// 1 16 0 4 -2 -40 0 0 0 -4 0 0 0 -8 box2-5.dat
  [1,16,0,4,-2,-40,0,0,0,-4,0,0,0,-8, ldraw_lib__box2_5()],
];
module ldraw_lib__8012(step=0, col=false, unit=2/5, alt=false, line=0.2, solid=!$preview)
    makepoly(ldraw_lib__8012(), step=step, col=col, unit=unit, alt=alt, line=line, solid=solid);
ldraw_lib__8012(line=0.2);
